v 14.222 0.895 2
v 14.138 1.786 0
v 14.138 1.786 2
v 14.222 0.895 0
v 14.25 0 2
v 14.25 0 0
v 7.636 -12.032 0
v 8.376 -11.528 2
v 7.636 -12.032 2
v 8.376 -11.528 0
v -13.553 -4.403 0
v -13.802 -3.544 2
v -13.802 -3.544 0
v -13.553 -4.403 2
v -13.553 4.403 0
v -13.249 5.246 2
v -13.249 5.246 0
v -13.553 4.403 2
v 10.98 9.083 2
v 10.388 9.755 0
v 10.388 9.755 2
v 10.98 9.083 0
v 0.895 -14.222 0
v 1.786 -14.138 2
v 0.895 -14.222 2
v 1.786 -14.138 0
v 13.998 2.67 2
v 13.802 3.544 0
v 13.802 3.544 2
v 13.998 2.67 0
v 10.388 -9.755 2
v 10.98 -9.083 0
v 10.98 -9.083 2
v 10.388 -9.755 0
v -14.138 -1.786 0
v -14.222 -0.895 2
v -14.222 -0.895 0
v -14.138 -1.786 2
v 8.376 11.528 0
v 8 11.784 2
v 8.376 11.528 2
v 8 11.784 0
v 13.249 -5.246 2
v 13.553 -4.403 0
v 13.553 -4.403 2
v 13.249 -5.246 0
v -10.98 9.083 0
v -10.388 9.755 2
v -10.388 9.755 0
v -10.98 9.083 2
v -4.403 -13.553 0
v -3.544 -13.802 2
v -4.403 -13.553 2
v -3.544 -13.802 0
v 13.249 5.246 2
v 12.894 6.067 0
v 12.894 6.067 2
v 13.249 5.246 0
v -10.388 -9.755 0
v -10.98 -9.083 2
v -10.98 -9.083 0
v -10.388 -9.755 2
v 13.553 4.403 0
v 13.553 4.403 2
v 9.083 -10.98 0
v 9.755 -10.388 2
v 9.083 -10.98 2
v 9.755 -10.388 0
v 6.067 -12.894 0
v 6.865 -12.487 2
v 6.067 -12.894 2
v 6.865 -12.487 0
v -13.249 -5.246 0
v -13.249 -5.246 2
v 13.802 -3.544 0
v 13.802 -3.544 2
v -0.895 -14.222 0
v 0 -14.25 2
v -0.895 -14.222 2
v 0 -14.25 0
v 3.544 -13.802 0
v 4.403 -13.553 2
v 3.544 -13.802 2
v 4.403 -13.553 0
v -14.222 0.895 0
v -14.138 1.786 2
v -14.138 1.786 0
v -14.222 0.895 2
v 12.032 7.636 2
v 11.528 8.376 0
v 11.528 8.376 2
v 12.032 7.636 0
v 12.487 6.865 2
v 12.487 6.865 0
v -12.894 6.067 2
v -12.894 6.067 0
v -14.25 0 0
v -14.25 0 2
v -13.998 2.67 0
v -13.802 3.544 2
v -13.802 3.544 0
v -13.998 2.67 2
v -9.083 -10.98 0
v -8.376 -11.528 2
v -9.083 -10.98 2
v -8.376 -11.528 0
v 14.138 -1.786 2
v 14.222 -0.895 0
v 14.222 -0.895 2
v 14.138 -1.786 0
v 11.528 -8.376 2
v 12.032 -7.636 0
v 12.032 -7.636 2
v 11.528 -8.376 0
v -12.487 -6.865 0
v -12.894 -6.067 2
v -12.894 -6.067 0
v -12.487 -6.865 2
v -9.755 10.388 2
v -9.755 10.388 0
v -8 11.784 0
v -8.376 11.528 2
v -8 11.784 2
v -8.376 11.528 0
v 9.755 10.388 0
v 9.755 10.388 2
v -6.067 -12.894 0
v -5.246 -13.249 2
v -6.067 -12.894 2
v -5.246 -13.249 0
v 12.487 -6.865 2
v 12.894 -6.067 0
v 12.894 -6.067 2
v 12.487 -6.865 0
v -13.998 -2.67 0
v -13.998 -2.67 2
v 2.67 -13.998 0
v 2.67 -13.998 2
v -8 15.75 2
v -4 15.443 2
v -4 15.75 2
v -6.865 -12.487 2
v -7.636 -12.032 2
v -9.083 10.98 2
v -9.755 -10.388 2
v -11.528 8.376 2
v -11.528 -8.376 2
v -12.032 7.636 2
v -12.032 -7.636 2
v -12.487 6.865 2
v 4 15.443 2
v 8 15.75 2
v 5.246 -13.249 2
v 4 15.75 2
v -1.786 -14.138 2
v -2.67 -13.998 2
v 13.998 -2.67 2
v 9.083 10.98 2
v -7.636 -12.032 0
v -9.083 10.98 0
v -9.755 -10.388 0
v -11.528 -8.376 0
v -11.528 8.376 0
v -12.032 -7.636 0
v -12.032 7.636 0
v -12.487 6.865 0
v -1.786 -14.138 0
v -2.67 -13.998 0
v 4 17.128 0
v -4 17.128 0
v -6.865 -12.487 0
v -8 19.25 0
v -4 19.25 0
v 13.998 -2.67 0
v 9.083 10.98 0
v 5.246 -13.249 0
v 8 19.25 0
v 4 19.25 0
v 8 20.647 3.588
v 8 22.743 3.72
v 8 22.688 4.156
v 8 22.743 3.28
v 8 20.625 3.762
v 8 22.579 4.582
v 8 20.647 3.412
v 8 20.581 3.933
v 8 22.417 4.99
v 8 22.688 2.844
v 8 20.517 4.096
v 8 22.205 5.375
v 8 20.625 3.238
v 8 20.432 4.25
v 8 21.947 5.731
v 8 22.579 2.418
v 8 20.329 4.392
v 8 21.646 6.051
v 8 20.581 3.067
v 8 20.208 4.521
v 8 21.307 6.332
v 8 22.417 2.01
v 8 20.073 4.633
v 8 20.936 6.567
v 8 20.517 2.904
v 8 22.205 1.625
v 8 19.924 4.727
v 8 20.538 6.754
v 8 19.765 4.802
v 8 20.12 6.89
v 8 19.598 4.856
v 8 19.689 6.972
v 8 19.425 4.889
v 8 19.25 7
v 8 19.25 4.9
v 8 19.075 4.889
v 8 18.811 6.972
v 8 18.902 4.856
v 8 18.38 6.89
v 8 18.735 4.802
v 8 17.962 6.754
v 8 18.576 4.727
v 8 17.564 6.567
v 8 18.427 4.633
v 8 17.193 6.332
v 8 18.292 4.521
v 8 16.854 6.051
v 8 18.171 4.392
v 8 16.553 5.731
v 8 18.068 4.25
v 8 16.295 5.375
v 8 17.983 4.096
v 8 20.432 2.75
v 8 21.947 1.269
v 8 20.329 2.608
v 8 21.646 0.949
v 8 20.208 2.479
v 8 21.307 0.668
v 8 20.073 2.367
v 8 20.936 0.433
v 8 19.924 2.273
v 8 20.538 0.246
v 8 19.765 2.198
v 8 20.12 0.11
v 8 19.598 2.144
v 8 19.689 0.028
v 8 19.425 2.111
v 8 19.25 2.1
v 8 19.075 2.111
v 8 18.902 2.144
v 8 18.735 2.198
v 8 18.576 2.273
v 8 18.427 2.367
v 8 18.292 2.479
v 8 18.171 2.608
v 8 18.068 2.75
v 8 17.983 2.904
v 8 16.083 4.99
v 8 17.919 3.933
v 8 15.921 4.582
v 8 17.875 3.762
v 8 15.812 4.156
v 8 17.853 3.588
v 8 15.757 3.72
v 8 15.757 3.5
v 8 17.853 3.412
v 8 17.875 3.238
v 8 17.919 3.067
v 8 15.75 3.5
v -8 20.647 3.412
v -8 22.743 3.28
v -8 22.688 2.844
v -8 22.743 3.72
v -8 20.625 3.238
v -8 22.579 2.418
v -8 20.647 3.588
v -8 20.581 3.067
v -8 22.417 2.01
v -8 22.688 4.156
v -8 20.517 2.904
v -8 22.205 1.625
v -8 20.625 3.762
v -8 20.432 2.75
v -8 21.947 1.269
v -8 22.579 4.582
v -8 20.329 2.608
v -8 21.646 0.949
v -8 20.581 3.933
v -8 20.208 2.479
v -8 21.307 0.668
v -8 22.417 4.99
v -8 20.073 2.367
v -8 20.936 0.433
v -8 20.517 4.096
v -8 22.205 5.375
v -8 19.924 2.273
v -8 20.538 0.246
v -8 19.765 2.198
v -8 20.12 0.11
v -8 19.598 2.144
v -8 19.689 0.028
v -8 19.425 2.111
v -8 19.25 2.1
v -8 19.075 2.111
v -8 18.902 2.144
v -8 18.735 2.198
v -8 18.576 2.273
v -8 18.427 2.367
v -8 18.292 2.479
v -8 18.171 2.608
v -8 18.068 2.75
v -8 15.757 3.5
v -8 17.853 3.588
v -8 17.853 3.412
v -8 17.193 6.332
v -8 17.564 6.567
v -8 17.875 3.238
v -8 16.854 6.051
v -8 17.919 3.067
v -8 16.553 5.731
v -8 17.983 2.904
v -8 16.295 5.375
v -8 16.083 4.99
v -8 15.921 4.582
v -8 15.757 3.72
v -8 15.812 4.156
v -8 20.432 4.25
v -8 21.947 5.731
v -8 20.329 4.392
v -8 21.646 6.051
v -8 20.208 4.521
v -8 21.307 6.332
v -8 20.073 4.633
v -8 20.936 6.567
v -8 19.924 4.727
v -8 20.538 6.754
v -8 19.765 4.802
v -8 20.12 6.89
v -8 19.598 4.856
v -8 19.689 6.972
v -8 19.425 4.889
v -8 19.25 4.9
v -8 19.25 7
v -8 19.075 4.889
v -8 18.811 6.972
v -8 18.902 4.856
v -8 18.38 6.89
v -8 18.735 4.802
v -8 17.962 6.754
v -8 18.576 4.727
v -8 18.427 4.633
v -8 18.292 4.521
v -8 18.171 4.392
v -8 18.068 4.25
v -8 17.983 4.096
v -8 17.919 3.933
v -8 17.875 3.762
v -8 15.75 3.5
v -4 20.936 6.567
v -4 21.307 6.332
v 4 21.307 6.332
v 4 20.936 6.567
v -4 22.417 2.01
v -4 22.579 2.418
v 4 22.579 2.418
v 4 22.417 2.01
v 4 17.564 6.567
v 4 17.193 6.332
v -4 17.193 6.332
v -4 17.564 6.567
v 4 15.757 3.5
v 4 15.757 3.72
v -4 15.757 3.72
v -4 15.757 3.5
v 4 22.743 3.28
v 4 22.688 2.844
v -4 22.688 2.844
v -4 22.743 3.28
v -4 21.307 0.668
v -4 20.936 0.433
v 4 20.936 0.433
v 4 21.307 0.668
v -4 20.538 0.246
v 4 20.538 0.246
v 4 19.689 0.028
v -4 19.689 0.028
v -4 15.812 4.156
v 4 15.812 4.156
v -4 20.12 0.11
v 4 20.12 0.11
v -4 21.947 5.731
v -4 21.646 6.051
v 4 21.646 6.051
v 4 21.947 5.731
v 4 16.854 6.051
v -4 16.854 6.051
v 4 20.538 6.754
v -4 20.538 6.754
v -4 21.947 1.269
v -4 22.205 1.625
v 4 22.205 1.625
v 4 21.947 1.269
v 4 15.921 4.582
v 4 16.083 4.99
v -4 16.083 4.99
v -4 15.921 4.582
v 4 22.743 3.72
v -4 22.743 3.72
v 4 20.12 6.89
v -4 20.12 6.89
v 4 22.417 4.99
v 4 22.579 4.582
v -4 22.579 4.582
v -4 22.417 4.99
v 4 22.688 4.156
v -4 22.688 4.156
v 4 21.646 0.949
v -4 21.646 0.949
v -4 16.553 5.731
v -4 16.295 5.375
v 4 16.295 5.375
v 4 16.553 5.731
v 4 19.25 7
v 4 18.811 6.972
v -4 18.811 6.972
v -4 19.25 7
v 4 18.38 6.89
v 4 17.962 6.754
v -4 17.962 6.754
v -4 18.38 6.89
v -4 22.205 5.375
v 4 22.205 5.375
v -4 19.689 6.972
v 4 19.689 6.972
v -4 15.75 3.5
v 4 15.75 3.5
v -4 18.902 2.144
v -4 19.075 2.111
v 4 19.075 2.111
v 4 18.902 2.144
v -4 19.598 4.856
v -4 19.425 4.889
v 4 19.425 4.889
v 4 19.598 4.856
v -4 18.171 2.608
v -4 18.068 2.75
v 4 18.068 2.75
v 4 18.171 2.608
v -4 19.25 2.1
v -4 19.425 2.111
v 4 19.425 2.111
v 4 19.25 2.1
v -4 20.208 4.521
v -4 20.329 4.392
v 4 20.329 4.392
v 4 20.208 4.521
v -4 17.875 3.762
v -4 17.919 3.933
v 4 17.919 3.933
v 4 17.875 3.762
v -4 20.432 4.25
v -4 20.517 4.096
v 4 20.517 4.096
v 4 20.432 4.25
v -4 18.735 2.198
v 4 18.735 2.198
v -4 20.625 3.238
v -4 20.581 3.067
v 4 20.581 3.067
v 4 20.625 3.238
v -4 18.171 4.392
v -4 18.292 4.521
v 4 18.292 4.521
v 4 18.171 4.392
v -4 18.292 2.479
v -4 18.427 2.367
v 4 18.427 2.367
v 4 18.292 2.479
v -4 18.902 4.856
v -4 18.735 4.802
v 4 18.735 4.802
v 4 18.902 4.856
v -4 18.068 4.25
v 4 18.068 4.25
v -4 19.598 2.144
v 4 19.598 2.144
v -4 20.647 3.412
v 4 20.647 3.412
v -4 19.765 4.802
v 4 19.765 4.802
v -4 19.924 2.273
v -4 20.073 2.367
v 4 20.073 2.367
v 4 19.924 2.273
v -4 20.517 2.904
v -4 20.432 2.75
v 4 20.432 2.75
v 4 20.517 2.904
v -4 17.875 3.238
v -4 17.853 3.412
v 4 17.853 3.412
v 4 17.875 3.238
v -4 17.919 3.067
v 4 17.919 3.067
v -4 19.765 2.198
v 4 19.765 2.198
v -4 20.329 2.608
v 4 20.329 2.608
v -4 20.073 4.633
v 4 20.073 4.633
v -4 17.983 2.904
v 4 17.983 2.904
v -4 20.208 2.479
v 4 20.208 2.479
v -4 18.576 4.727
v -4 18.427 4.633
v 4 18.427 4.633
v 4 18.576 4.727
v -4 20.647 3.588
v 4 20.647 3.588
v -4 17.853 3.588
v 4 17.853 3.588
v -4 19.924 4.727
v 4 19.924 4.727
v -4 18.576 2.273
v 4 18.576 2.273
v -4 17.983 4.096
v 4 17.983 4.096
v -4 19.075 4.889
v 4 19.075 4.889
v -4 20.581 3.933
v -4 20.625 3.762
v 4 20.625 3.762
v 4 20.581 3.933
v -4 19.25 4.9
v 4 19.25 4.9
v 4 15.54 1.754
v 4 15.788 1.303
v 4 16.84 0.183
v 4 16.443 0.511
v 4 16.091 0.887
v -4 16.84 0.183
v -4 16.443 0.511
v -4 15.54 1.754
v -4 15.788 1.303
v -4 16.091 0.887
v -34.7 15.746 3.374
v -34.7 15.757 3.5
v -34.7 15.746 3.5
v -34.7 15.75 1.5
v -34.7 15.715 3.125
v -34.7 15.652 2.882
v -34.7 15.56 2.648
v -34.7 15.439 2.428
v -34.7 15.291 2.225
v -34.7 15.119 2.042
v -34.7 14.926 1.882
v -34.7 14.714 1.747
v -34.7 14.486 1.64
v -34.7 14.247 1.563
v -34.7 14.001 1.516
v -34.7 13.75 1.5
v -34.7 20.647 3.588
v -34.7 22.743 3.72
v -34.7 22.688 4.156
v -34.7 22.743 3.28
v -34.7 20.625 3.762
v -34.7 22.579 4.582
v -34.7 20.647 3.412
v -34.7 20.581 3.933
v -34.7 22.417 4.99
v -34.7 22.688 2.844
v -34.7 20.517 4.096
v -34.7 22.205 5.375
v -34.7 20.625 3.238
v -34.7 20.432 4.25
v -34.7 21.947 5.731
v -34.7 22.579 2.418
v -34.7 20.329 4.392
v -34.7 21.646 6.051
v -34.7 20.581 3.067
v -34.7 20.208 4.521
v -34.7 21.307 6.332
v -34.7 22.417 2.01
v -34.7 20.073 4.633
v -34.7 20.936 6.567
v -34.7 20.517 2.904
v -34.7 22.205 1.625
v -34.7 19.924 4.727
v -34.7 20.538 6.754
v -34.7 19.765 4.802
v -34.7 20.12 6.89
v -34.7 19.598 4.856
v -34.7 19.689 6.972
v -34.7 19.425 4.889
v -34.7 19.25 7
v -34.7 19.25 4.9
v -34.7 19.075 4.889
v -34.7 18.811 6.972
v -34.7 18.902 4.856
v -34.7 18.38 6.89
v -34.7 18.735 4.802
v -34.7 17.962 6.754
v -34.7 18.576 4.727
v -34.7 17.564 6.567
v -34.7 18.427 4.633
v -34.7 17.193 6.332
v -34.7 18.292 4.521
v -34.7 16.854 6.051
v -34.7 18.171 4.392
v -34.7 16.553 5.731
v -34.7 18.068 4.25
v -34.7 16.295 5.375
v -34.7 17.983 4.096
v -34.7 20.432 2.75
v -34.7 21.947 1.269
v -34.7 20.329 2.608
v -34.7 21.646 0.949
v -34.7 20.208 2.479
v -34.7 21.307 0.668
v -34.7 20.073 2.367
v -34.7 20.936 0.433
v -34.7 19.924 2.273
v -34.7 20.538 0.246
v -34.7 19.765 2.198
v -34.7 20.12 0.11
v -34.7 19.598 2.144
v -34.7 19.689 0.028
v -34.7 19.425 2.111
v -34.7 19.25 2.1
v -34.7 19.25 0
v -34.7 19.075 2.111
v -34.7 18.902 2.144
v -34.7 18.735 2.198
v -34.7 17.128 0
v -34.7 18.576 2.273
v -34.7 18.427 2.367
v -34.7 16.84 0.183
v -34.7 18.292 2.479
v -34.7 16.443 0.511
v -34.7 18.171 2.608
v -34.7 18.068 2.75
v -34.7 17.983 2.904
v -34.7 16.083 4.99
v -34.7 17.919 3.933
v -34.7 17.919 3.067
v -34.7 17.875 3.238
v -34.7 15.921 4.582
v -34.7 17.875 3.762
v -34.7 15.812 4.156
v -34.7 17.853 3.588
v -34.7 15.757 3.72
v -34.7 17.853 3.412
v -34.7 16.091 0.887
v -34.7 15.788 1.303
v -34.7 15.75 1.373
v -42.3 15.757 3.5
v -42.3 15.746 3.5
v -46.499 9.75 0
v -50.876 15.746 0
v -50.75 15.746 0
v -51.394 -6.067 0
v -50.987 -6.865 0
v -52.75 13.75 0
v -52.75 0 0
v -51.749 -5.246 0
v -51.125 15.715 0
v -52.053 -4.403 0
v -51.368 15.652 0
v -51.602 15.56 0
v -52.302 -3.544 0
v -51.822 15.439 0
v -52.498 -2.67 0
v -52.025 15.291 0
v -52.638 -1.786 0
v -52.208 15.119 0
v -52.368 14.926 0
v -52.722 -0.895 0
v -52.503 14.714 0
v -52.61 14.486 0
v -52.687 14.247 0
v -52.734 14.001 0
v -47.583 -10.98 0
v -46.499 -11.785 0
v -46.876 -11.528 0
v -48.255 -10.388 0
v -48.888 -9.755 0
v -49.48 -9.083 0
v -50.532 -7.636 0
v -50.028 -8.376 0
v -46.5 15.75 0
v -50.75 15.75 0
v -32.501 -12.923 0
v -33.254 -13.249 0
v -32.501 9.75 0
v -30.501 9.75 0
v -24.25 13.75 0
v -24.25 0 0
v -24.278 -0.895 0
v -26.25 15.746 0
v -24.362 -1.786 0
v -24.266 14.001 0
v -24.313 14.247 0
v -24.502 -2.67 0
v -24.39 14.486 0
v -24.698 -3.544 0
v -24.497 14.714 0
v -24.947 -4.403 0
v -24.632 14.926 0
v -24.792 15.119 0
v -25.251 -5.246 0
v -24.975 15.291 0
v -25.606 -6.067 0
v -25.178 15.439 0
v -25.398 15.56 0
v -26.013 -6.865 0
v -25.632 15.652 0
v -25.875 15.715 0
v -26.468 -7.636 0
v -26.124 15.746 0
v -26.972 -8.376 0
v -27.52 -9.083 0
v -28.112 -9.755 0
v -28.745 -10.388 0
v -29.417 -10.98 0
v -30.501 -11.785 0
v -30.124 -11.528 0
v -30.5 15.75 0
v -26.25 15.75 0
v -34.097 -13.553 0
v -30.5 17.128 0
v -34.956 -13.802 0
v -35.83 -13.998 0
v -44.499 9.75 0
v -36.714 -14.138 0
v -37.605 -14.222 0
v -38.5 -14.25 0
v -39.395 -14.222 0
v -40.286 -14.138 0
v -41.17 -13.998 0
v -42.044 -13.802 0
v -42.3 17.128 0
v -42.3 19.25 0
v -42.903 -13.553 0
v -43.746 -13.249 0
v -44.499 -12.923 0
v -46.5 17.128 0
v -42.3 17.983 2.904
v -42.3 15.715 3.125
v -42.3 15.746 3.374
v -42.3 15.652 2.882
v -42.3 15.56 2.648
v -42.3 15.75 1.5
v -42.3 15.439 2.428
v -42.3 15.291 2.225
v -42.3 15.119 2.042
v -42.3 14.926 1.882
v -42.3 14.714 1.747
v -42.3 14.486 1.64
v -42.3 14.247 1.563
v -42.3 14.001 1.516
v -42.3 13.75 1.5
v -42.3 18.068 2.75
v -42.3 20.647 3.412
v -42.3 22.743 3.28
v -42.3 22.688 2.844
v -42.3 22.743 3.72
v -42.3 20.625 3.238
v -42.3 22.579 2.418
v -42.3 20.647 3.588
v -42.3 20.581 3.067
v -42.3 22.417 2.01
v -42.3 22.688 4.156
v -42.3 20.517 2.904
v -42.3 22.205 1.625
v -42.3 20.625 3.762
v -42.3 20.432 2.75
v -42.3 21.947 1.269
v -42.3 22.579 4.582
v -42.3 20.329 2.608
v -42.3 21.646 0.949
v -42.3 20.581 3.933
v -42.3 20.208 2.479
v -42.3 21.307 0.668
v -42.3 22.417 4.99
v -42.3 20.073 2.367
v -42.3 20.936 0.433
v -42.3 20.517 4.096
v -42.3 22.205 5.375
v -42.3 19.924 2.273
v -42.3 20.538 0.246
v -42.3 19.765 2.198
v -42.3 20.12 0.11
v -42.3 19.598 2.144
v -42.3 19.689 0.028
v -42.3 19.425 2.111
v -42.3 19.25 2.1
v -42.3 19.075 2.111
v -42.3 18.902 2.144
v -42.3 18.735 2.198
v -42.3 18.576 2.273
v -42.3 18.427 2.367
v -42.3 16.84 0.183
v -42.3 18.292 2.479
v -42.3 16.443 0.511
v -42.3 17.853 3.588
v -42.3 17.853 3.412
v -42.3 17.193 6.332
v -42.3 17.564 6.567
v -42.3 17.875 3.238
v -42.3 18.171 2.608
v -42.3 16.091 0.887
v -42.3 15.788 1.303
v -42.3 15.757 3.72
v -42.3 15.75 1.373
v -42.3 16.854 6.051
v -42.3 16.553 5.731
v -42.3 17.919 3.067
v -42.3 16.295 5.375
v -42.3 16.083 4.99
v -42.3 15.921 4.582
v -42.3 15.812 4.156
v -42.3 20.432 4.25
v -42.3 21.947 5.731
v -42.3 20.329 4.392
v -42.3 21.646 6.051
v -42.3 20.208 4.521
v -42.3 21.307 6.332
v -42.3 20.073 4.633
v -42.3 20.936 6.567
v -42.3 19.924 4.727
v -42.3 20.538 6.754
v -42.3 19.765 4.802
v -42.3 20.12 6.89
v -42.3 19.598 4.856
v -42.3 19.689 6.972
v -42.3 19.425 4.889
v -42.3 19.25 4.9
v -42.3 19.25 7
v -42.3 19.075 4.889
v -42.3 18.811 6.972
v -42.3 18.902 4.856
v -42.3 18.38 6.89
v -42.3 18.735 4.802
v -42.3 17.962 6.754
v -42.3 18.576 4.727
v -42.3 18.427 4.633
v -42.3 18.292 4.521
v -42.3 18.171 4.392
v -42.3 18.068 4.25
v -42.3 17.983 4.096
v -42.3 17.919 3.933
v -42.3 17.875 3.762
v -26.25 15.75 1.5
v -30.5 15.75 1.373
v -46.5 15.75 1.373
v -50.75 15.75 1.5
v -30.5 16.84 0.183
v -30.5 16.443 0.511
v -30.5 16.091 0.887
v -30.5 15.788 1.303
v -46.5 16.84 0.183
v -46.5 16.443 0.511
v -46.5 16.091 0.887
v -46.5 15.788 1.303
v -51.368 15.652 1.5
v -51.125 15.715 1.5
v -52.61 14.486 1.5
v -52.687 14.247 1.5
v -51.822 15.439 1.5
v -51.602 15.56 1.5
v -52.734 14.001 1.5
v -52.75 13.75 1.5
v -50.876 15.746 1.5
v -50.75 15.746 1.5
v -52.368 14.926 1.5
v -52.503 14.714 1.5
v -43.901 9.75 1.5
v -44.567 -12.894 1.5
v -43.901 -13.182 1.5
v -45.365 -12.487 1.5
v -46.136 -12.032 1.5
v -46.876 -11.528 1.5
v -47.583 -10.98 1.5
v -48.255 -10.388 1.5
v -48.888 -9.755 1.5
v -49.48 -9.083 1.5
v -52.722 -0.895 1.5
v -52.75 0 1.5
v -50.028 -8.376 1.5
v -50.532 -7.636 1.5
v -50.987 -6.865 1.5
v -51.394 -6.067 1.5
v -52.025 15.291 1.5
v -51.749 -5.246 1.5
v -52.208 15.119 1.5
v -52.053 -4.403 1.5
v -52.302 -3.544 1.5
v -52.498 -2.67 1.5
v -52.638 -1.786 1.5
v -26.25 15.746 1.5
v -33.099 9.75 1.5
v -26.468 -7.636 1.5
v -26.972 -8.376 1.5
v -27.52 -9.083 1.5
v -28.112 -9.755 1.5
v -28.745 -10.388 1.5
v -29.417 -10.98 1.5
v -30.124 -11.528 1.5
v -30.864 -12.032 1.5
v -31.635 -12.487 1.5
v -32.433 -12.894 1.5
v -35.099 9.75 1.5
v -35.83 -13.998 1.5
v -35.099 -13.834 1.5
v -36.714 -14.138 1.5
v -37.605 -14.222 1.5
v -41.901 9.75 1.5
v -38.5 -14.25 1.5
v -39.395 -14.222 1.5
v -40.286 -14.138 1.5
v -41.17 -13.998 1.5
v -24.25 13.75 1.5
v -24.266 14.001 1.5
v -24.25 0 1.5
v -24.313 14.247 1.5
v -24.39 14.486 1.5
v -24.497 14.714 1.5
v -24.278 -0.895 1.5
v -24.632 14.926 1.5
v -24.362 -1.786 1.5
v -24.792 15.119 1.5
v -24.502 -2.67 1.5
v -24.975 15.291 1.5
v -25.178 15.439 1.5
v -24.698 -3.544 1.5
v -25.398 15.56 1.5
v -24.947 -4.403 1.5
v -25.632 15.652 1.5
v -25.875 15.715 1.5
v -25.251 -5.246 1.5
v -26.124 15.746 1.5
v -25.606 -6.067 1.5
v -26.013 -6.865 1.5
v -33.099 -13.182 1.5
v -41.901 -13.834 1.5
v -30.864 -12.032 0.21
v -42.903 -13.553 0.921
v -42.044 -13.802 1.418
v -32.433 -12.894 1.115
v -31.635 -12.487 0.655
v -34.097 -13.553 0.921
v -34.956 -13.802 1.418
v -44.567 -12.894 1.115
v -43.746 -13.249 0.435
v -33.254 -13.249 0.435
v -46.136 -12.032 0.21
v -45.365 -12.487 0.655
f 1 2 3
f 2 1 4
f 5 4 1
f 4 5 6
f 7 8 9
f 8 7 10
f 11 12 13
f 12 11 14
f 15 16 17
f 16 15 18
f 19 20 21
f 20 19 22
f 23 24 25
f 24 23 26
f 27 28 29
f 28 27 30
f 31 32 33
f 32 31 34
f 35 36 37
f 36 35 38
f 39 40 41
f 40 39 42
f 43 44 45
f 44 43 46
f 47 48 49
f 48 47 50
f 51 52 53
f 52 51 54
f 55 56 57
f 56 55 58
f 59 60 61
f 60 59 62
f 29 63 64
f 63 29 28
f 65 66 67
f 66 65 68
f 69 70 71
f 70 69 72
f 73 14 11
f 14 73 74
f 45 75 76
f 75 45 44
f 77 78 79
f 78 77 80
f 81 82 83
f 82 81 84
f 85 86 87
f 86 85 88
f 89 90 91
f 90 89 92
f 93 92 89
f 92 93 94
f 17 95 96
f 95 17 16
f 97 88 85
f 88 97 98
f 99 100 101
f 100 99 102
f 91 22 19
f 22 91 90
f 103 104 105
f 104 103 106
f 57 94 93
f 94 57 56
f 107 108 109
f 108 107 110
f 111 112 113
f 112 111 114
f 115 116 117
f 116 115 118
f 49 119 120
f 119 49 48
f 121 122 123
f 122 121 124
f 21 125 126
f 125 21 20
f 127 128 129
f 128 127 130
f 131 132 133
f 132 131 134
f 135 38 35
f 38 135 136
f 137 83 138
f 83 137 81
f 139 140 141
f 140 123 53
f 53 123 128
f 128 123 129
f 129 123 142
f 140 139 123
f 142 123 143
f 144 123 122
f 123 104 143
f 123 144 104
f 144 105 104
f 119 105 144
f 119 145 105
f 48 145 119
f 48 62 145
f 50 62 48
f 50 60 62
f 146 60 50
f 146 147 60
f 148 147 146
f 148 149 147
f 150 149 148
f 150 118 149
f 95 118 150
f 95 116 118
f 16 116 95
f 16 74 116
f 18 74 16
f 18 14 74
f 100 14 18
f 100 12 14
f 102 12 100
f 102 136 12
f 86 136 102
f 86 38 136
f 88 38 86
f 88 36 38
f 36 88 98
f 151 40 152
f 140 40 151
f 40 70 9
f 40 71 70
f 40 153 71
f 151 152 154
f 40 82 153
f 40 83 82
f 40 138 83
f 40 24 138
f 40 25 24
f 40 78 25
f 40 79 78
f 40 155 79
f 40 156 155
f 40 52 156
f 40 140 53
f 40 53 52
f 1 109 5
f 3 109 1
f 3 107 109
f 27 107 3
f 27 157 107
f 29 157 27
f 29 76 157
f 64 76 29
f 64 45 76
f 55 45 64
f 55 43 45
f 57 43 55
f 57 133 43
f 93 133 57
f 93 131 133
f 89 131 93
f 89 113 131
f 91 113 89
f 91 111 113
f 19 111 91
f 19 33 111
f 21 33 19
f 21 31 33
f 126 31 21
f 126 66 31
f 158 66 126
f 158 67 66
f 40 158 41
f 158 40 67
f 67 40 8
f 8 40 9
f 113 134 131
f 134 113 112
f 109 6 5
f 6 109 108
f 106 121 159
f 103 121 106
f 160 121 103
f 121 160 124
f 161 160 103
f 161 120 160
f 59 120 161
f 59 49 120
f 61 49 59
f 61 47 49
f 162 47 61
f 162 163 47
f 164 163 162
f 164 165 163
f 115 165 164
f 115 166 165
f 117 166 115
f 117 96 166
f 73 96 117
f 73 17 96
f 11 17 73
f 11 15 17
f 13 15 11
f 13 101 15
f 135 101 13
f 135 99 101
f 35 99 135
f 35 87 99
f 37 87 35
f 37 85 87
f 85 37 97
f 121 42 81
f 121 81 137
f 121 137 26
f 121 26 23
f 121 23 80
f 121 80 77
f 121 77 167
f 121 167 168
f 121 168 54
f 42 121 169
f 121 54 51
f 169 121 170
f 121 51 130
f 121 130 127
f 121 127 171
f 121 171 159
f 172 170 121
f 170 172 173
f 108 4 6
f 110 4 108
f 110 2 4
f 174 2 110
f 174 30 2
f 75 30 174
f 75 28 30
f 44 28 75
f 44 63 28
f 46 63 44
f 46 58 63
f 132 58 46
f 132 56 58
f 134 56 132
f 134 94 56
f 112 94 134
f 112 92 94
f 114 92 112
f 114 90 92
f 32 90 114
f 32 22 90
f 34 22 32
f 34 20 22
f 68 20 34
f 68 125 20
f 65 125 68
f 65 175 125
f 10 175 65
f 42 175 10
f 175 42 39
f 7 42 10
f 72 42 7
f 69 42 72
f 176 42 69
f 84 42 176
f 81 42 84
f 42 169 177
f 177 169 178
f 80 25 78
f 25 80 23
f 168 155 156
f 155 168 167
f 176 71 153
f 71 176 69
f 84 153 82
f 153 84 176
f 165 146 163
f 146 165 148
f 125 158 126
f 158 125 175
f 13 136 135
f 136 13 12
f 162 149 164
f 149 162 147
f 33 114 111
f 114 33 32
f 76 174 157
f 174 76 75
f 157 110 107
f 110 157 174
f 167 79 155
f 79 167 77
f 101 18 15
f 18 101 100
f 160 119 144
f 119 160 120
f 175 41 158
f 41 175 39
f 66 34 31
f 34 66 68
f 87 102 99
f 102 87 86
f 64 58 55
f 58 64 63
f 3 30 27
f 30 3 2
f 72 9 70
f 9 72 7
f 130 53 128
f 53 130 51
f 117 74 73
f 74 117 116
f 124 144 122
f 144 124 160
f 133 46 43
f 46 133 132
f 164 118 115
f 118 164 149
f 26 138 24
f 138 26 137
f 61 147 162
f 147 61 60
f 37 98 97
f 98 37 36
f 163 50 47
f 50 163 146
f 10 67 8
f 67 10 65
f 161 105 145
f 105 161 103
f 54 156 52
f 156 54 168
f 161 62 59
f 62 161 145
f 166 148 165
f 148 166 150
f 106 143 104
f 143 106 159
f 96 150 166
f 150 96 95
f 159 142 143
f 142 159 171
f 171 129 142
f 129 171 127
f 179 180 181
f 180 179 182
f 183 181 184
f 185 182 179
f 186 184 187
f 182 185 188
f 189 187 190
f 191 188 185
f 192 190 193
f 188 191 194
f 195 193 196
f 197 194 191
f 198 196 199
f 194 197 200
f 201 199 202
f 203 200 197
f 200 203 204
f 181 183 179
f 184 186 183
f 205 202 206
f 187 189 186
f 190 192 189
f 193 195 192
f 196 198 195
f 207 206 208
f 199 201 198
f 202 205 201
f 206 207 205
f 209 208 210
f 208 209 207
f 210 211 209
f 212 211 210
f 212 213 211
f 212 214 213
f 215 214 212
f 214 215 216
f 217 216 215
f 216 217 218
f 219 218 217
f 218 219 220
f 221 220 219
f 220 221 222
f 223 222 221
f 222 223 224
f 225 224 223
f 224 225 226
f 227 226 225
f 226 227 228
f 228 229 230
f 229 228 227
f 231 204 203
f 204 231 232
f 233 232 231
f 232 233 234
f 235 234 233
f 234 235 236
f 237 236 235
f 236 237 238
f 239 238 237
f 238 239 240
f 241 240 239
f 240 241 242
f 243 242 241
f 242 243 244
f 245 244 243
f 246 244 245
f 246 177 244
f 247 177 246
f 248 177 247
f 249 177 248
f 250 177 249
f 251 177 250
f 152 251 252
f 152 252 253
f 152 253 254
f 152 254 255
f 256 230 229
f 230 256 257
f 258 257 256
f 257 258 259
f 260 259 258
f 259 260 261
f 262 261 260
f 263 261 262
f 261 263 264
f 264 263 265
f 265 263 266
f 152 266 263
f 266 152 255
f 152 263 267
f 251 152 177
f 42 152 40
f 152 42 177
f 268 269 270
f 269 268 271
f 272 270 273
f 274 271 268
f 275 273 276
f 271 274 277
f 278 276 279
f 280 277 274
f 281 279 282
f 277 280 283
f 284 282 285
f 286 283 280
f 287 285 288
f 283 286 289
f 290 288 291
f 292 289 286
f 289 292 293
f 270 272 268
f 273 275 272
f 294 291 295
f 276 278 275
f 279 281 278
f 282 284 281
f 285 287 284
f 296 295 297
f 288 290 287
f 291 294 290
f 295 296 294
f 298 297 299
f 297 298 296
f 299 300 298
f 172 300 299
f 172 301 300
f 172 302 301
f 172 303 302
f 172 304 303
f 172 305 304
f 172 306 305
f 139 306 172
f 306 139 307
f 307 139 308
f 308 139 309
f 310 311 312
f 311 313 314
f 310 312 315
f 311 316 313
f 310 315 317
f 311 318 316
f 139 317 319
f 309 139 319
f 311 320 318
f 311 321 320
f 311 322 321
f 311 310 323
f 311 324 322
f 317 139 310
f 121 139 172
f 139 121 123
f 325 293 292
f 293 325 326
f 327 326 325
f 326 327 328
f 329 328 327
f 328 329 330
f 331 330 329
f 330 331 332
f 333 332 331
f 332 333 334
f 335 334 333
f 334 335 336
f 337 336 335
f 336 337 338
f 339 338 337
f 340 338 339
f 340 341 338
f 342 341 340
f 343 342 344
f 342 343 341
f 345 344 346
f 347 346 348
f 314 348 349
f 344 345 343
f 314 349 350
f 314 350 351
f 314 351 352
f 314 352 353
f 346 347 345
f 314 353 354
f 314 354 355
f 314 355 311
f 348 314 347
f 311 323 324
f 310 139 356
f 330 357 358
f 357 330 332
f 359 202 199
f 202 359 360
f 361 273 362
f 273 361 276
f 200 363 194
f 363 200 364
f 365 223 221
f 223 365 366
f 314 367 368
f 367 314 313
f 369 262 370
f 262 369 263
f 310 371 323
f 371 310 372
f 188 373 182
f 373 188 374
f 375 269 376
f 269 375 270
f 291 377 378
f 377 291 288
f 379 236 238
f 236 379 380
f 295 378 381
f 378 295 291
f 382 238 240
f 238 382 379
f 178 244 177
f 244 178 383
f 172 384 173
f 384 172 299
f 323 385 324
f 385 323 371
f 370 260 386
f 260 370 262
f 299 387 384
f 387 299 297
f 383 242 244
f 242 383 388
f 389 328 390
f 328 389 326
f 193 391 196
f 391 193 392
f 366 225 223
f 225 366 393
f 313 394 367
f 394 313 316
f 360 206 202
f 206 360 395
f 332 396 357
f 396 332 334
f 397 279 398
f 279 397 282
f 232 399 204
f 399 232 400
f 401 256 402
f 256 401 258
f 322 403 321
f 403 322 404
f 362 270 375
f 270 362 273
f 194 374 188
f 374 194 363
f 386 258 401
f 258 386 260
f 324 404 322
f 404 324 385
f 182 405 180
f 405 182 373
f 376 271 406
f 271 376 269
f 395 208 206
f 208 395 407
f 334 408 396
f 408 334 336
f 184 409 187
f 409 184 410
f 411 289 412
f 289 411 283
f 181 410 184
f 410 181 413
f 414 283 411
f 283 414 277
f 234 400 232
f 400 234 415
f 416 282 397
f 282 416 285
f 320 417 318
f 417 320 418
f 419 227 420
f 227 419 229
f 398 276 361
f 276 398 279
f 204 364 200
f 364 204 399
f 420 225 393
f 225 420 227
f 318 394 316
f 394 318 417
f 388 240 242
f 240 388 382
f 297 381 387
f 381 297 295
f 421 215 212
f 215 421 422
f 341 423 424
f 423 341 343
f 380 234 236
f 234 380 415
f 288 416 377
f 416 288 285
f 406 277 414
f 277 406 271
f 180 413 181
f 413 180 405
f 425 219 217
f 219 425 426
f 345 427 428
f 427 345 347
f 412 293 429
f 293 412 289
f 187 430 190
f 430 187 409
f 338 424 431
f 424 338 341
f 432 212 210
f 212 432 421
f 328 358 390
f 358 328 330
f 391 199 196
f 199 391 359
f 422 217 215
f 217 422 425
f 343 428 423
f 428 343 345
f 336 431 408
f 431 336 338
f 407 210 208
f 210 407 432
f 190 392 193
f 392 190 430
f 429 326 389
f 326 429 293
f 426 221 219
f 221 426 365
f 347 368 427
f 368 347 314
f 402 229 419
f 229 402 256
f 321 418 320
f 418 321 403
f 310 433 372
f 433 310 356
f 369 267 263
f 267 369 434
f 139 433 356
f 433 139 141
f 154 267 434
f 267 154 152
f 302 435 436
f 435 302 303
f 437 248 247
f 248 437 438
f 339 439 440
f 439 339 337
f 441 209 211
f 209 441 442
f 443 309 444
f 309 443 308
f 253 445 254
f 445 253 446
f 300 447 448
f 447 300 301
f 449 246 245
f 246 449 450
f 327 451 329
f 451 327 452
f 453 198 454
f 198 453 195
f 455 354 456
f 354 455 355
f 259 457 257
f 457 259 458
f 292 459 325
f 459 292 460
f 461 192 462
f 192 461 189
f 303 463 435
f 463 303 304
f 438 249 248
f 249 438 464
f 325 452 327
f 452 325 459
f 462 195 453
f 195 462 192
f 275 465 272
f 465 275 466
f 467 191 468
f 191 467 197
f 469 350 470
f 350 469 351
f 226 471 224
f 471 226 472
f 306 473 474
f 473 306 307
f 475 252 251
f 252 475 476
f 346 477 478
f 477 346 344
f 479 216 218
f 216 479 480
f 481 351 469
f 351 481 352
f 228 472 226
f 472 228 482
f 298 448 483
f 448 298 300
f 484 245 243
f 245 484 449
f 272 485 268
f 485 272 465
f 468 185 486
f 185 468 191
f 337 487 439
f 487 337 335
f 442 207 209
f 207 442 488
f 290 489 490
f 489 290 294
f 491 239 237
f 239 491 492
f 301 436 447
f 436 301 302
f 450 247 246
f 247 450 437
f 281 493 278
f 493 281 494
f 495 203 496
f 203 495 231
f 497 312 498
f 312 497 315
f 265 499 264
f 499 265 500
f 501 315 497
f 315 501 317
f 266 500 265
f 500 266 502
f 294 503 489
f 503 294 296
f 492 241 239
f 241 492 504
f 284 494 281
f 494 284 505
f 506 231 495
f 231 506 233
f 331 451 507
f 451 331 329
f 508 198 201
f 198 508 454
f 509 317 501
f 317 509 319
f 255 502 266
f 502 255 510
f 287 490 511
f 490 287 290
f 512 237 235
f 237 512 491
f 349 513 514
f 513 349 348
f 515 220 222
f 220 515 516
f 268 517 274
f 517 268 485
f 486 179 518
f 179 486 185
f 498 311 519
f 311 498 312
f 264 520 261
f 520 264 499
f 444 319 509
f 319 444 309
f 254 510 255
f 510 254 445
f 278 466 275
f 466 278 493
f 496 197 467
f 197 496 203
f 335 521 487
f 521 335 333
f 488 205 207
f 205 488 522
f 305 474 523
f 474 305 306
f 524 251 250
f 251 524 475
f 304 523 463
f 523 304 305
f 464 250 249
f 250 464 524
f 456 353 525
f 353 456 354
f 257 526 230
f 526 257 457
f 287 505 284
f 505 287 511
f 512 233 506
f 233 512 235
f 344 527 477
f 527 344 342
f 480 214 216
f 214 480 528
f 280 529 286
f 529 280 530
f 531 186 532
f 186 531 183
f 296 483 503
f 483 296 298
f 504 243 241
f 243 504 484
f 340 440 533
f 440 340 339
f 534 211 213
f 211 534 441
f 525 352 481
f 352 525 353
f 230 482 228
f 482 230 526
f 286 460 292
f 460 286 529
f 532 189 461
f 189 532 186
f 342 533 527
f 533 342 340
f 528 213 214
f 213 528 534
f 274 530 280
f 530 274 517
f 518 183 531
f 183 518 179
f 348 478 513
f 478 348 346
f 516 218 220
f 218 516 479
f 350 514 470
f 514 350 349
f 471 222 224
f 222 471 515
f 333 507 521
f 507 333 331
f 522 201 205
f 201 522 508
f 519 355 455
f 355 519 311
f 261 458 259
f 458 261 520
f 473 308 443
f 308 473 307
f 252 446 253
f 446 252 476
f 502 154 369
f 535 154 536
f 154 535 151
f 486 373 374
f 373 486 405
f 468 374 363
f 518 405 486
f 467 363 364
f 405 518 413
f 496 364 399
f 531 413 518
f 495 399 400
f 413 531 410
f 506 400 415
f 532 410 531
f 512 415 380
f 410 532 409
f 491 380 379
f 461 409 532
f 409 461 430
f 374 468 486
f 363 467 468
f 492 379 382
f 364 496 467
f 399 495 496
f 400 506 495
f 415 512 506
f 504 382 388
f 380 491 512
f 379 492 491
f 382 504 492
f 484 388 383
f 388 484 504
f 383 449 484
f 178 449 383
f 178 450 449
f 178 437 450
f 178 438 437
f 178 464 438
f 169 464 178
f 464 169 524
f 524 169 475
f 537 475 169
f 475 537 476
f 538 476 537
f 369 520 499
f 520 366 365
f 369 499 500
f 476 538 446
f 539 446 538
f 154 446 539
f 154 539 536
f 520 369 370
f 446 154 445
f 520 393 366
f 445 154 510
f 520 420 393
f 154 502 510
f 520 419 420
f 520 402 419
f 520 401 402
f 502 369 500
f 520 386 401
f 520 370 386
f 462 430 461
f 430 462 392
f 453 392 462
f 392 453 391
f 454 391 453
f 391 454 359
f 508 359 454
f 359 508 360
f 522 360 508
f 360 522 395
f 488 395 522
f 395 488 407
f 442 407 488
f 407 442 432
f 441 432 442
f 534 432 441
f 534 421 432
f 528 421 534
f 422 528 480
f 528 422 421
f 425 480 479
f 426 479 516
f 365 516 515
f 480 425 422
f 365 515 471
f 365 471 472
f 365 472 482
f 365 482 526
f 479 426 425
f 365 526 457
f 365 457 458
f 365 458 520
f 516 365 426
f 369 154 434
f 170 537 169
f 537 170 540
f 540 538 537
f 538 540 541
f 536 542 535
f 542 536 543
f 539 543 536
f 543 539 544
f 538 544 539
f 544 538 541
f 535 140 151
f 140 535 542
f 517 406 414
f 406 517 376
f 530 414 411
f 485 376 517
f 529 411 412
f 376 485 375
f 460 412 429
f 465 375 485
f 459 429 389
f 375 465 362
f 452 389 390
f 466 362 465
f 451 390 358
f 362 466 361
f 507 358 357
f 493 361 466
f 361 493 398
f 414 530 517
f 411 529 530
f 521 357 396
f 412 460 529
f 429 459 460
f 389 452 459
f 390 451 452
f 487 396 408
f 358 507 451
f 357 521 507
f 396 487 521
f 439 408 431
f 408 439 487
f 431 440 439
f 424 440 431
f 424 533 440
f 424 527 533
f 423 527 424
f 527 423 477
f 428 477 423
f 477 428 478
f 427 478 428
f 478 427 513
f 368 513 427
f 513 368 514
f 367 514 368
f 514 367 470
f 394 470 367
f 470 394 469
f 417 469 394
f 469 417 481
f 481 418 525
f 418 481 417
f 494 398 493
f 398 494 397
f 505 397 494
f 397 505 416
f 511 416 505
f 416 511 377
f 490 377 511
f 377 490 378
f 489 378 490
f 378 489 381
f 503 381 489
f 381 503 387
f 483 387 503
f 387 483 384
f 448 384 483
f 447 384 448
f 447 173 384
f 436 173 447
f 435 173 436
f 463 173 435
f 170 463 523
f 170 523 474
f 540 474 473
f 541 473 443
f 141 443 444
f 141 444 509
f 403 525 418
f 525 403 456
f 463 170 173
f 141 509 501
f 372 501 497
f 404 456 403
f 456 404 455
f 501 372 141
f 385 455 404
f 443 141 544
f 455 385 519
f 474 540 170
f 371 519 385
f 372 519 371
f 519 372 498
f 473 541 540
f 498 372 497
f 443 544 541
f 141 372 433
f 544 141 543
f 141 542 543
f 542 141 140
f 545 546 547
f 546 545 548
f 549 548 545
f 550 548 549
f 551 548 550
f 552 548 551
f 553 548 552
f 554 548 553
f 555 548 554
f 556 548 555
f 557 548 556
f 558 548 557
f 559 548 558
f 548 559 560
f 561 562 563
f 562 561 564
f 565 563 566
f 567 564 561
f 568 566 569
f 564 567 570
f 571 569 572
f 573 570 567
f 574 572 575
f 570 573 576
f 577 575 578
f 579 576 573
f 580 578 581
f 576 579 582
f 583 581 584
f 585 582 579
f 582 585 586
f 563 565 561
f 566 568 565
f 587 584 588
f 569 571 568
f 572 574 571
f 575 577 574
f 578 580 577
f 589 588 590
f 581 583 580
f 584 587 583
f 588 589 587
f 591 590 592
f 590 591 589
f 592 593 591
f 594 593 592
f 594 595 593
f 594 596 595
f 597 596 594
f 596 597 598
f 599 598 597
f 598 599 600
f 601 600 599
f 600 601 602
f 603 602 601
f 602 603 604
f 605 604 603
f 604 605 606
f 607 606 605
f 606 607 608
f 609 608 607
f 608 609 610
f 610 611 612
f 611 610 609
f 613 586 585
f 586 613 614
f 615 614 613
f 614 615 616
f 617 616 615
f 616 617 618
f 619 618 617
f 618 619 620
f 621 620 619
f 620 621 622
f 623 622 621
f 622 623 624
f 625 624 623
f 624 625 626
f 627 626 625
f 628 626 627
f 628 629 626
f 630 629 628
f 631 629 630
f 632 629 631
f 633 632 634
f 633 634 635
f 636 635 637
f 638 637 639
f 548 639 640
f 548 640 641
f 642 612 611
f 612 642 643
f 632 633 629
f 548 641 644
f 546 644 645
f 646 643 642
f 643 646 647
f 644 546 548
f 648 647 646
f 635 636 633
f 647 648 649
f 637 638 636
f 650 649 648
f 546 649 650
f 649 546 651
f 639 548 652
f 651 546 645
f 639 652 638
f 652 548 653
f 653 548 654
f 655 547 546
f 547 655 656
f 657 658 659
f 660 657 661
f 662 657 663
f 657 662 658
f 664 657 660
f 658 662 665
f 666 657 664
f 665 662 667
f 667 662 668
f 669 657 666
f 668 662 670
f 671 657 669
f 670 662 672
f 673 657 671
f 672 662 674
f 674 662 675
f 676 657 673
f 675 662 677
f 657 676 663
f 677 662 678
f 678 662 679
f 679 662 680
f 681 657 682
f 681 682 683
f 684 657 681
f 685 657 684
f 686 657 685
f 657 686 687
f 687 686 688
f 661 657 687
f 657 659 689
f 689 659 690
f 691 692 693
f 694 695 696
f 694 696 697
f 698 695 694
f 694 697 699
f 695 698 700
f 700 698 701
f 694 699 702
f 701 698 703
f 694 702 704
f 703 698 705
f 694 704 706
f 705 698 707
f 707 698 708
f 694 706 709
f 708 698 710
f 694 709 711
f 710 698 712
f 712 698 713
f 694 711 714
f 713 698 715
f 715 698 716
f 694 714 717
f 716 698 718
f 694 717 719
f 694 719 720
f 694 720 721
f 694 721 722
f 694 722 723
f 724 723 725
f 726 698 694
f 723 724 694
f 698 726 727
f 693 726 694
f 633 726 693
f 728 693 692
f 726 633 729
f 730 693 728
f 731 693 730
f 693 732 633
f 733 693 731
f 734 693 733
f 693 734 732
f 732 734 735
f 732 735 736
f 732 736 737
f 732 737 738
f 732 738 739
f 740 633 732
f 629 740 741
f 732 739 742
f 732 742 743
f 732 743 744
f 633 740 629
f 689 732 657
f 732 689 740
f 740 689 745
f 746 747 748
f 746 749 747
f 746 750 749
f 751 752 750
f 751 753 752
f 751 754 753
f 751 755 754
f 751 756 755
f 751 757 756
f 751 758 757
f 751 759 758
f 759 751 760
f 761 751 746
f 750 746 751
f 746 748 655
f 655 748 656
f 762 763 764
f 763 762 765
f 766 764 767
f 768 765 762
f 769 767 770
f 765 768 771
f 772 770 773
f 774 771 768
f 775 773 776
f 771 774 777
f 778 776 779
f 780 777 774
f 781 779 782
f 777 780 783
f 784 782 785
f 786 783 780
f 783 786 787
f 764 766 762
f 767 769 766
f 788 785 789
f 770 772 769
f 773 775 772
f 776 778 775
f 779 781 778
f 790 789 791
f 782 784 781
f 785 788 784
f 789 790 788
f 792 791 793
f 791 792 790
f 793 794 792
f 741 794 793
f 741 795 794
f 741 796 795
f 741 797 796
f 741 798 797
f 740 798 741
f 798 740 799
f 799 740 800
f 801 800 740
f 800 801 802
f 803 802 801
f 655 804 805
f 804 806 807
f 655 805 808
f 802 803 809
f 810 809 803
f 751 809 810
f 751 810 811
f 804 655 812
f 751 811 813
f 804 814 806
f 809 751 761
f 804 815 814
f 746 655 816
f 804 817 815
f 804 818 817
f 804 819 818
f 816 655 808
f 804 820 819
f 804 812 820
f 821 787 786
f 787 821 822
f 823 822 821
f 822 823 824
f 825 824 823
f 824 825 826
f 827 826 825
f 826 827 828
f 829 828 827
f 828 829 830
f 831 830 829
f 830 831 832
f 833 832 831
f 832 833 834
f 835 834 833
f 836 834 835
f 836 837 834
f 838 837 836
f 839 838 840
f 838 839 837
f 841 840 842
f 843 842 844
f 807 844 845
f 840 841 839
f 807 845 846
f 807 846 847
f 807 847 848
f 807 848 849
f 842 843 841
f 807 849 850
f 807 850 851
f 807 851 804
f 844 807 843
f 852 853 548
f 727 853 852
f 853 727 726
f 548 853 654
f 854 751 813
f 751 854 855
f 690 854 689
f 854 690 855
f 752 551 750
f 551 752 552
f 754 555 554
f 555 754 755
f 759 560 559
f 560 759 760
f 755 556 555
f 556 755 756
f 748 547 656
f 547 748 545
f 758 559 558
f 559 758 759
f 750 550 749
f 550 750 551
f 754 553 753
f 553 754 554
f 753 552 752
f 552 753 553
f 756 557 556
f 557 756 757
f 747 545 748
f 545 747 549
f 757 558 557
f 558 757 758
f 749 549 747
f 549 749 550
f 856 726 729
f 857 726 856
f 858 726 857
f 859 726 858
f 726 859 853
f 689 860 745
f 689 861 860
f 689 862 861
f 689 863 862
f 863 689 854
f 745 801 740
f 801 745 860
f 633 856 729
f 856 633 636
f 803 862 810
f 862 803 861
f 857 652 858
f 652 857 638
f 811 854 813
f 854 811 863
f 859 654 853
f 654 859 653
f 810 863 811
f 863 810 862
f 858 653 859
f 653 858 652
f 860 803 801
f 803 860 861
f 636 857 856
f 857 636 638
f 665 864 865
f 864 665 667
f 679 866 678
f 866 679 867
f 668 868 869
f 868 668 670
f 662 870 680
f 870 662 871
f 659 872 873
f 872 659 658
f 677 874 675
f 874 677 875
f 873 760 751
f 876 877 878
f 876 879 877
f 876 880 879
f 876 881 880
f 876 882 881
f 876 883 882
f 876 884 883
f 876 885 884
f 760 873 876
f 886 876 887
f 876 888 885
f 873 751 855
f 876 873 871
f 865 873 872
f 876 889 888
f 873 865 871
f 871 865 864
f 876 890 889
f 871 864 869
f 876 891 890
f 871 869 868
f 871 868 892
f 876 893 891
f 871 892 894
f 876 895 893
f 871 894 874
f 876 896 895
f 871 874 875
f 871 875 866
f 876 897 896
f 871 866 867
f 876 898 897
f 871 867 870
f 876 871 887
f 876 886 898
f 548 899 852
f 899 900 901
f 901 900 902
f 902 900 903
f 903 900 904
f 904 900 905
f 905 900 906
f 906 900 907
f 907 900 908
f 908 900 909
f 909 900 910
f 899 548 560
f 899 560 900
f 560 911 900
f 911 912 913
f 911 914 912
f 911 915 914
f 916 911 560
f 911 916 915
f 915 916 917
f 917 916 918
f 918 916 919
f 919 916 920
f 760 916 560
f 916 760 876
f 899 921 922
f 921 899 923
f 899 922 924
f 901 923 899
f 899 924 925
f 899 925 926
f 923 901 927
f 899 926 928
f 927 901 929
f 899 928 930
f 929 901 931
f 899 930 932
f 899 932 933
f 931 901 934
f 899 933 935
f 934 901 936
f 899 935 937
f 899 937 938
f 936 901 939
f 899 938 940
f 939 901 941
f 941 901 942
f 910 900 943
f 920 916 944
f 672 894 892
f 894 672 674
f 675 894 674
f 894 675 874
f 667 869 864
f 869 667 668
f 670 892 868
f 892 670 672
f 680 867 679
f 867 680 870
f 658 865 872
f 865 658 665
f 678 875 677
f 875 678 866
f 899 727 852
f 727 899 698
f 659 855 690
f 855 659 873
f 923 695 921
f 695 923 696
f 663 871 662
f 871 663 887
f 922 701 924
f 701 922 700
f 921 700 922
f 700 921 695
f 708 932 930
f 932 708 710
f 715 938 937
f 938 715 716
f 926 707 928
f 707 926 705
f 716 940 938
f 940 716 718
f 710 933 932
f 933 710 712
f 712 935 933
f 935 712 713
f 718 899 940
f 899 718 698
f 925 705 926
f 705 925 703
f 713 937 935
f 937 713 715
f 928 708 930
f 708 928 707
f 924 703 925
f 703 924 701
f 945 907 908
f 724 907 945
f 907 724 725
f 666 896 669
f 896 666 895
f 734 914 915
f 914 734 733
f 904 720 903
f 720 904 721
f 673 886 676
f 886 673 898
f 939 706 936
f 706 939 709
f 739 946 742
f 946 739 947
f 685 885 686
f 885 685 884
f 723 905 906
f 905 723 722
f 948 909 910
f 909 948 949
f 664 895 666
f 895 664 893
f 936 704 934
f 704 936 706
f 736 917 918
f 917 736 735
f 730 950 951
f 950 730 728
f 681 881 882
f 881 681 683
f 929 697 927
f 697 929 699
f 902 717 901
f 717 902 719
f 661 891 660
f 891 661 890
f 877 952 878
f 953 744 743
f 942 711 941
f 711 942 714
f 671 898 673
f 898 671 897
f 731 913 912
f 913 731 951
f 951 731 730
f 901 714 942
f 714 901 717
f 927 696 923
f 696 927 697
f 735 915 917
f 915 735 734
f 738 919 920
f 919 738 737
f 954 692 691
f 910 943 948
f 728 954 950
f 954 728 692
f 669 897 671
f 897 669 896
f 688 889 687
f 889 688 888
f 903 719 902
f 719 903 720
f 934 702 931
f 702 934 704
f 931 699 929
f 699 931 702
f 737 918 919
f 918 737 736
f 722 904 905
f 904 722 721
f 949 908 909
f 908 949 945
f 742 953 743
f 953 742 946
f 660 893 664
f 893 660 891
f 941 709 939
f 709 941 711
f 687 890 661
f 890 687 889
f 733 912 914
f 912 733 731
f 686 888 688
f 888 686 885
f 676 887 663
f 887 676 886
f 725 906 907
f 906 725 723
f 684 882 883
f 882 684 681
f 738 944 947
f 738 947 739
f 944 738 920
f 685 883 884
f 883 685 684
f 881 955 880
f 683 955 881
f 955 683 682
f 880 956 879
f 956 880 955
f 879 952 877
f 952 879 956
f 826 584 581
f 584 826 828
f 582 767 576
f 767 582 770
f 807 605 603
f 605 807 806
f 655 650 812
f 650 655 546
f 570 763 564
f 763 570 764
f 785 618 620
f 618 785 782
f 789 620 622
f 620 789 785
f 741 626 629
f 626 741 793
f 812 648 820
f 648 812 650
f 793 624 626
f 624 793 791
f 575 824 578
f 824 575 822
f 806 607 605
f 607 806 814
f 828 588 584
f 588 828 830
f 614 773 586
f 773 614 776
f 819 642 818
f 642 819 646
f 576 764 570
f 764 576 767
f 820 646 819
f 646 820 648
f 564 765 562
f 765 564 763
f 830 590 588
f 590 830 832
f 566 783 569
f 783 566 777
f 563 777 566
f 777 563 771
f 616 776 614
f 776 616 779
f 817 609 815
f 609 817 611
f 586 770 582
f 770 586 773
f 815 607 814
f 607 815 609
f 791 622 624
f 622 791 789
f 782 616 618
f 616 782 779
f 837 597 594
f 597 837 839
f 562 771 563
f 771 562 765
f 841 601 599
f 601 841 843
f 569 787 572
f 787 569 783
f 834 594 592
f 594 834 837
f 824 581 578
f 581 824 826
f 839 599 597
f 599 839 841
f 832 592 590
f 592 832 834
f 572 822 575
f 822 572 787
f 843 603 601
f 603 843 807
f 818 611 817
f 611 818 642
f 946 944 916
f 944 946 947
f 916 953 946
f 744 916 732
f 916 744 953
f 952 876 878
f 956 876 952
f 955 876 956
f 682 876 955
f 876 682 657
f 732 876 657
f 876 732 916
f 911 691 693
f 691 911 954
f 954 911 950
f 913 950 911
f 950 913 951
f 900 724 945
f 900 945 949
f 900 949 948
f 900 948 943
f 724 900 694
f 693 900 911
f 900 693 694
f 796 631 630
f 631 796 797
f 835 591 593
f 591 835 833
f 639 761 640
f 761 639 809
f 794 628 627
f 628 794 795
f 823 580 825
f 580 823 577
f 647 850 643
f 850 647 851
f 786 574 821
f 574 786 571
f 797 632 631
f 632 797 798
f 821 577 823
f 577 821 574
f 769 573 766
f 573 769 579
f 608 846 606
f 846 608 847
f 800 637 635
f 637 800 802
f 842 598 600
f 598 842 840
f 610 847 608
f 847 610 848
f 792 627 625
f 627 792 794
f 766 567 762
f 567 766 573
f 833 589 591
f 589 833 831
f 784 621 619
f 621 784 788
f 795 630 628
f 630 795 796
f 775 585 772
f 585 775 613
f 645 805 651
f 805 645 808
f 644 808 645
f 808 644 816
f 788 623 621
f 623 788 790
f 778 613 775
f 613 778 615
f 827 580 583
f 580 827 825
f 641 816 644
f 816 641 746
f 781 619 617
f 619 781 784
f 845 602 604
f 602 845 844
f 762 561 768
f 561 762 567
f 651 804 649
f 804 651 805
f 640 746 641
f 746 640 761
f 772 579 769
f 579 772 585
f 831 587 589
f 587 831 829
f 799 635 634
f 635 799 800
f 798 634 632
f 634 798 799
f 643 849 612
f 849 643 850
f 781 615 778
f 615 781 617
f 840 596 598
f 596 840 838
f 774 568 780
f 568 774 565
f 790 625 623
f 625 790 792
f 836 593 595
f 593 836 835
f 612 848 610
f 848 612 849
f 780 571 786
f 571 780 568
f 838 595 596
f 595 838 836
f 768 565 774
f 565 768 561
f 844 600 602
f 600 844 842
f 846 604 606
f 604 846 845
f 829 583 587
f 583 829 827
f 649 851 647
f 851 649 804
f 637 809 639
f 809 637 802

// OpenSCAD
//Diameter of coin in mm
coin_diameter = 28.5;
//Thickness of coin in mm
coin_thickness = 2.0;
//Screw size in mm
screw_diameter = 3.0;
//Screw length in mm
screw_length = 16;
//Length of the neck in mm (affects the size of the paper clip)
neck_length = 5;
//Needed parts
parts = "Both"; //[Coin, Paperclip, Both]

wallthickness = 2*1;
coin_radius = coin_diameter / 2.0;
paperholder_thickness = 1.5*1;

module CreateCoin()
{
    difference()
    {
        union()
        {
            cylinder(h=coin_thickness, r=coin_radius, $fn = 100);
            translate([-screw_length/2, 0, 0 ])
            cube([screw_length, neck_length+coin_radius, coin_thickness]);
            translate([-screw_length/2, neck_length+coin_radius, screw_diameter/2+wallthickness])
            rotate([0,90,0])
            cylinder(h=screw_length, r=screw_diameter/2+wallthickness, $fn = 50);
            translate([-screw_length/2, neck_length+coin_radius-screw_diameter/2-wallthickness, 0])
            cube([screw_length, screw_diameter/2+wallthickness, screw_diameter/2+wallthickness]);
        }
        union()
        {
            translate([-screw_length/2-1, neck_length+coin_radius, screw_diameter/2+wallthickness])
            rotate([0,90,0])
            cylinder(h=screw_length+2, r=screw_diameter/2-0.1, $fn = 50);
            translate([-screw_length/4, neck_length+coin_radius, screw_diameter/2+wallthickness])
            rotate([0,90,0])
            cylinder(h=screw_length/2, r=screw_diameter/2+wallthickness+0.6, $fn = 50);
        }
    }
}

module CreatePaperHolder()
{
    difference()
    {
        union()
        {
            yoffset = coin_radius+(neck_length-(screw_diameter/2+wallthickness)-((screw_diameter/2+wallthickness)-paperholder_thickness))-3;
            
            
            translate([-screw_length/4+0.2, neck_length+coin_radius, screw_diameter/2+wallthickness])
            rotate([0,90,0])
            cylinder(h=screw_length/2-0.4, r=screw_diameter/2+wallthickness, $fn = 50);
            translate([-screw_length/4+0.2, neck_length+coin_radius-(screw_diameter/2+wallthickness), 0])
            cube([screw_length/2-0.4, screw_diameter/2+wallthickness, screw_diameter/2+wallthickness]);
            difference()
            {
                translate([-screw_length/4+0.2, neck_length+coin_radius-(screw_diameter/2+wallthickness)-((screw_diameter/2+wallthickness)-paperholder_thickness), 0])
                cube([screw_length/2-0.4, ((screw_diameter/2+wallthickness)-paperholder_thickness), screw_diameter/2+wallthickness]);
                translate([-screw_length/4, neck_length+coin_radius-(screw_diameter/2+wallthickness)-((screw_diameter/2+wallthickness)-paperholder_thickness), screw_diameter/2+wallthickness])
                rotate([0,90,0])
                cylinder(h=screw_length/2, r=((screw_diameter/2+wallthickness)-paperholder_thickness), $fn=50);
            }
            difference()
            {
                translate([-screw_length/2, neck_length+coin_radius-(screw_diameter/2+wallthickness), 0])
                cube([screw_length, (screw_diameter/2+wallthickness), paperholder_thickness]);
                translate([-screw_length/2-1, neck_length+coin_radius, screw_diameter/2+wallthickness])
                rotate([0,90,0])
                cylinder(h=screw_length+2, r=screw_diameter/2+wallthickness+0.6, $fn = 50);
                
            }
            intersection()
            {
                length = coin_diameter+neck_length-(screw_diameter/2+wallthickness);
                union()
                {
                   translate([-coin_radius, -coin_radius, 0])
                   cube([coin_diameter, length-2, paperholder_thickness]);               translate([-coin_radius+2, -coin_radius+length-2, 0])
                   {
                        cylinder(r=2, h = paperholder_thickness, $fn=50);
                       cube([coin_diameter-4, 2, paperholder_thickness]);
                   }
                   translate([coin_radius-2, -coin_radius+length-2, 0])
                   cylinder(r=2, h = paperholder_thickness, $fn=50);                   
                }
                union()
                {
                    cylinder(r=coin_radius, h=paperholder_thickness, $fn=100);
                    translate([-coin_radius, 0, 0])
                    cube([coin_diameter, coin_radius+neck_length-(screw_diameter/2+wallthickness), paperholder_thickness]);
                    
                }
            }            
        }
        union()
        {
            translate([-screw_length/2-1, neck_length+coin_radius, screw_diameter/2+wallthickness])
            rotate([0,90,0])
            cylinder(h=screw_length+2, r=screw_diameter/2-0.1, $fn = 50);
            length = coin_diameter+neck_length-(screw_diameter/2+wallthickness);
            cutLength = length - 6;
            translate([0, -coin_radius, paperholder_thickness/2])
            {
                translate([-coin_diameter/5, 0, 0])
                rotate([0,60,0])
                cube([1, cutLength*2, 10], center = true);
                translate([coin_diameter/5, 0, 0])
                rotate([0,-60,0])
                cube([1, cutLength*2, 10], center = true);
            }
        }        
    }    
}

if( parts == "Both" || parts == "Coin" )
{
    CreateCoin();
}
if( parts == "Both" || parts == "Paperclip" )
{
    translate([-(coin_diameter+10), 0, 0])
    CreatePaperHolder();
}
//translate([0,0,screw_diameter+wallthickness*2])
//rotate([0,180,0])
//CreatePaperHolder();
